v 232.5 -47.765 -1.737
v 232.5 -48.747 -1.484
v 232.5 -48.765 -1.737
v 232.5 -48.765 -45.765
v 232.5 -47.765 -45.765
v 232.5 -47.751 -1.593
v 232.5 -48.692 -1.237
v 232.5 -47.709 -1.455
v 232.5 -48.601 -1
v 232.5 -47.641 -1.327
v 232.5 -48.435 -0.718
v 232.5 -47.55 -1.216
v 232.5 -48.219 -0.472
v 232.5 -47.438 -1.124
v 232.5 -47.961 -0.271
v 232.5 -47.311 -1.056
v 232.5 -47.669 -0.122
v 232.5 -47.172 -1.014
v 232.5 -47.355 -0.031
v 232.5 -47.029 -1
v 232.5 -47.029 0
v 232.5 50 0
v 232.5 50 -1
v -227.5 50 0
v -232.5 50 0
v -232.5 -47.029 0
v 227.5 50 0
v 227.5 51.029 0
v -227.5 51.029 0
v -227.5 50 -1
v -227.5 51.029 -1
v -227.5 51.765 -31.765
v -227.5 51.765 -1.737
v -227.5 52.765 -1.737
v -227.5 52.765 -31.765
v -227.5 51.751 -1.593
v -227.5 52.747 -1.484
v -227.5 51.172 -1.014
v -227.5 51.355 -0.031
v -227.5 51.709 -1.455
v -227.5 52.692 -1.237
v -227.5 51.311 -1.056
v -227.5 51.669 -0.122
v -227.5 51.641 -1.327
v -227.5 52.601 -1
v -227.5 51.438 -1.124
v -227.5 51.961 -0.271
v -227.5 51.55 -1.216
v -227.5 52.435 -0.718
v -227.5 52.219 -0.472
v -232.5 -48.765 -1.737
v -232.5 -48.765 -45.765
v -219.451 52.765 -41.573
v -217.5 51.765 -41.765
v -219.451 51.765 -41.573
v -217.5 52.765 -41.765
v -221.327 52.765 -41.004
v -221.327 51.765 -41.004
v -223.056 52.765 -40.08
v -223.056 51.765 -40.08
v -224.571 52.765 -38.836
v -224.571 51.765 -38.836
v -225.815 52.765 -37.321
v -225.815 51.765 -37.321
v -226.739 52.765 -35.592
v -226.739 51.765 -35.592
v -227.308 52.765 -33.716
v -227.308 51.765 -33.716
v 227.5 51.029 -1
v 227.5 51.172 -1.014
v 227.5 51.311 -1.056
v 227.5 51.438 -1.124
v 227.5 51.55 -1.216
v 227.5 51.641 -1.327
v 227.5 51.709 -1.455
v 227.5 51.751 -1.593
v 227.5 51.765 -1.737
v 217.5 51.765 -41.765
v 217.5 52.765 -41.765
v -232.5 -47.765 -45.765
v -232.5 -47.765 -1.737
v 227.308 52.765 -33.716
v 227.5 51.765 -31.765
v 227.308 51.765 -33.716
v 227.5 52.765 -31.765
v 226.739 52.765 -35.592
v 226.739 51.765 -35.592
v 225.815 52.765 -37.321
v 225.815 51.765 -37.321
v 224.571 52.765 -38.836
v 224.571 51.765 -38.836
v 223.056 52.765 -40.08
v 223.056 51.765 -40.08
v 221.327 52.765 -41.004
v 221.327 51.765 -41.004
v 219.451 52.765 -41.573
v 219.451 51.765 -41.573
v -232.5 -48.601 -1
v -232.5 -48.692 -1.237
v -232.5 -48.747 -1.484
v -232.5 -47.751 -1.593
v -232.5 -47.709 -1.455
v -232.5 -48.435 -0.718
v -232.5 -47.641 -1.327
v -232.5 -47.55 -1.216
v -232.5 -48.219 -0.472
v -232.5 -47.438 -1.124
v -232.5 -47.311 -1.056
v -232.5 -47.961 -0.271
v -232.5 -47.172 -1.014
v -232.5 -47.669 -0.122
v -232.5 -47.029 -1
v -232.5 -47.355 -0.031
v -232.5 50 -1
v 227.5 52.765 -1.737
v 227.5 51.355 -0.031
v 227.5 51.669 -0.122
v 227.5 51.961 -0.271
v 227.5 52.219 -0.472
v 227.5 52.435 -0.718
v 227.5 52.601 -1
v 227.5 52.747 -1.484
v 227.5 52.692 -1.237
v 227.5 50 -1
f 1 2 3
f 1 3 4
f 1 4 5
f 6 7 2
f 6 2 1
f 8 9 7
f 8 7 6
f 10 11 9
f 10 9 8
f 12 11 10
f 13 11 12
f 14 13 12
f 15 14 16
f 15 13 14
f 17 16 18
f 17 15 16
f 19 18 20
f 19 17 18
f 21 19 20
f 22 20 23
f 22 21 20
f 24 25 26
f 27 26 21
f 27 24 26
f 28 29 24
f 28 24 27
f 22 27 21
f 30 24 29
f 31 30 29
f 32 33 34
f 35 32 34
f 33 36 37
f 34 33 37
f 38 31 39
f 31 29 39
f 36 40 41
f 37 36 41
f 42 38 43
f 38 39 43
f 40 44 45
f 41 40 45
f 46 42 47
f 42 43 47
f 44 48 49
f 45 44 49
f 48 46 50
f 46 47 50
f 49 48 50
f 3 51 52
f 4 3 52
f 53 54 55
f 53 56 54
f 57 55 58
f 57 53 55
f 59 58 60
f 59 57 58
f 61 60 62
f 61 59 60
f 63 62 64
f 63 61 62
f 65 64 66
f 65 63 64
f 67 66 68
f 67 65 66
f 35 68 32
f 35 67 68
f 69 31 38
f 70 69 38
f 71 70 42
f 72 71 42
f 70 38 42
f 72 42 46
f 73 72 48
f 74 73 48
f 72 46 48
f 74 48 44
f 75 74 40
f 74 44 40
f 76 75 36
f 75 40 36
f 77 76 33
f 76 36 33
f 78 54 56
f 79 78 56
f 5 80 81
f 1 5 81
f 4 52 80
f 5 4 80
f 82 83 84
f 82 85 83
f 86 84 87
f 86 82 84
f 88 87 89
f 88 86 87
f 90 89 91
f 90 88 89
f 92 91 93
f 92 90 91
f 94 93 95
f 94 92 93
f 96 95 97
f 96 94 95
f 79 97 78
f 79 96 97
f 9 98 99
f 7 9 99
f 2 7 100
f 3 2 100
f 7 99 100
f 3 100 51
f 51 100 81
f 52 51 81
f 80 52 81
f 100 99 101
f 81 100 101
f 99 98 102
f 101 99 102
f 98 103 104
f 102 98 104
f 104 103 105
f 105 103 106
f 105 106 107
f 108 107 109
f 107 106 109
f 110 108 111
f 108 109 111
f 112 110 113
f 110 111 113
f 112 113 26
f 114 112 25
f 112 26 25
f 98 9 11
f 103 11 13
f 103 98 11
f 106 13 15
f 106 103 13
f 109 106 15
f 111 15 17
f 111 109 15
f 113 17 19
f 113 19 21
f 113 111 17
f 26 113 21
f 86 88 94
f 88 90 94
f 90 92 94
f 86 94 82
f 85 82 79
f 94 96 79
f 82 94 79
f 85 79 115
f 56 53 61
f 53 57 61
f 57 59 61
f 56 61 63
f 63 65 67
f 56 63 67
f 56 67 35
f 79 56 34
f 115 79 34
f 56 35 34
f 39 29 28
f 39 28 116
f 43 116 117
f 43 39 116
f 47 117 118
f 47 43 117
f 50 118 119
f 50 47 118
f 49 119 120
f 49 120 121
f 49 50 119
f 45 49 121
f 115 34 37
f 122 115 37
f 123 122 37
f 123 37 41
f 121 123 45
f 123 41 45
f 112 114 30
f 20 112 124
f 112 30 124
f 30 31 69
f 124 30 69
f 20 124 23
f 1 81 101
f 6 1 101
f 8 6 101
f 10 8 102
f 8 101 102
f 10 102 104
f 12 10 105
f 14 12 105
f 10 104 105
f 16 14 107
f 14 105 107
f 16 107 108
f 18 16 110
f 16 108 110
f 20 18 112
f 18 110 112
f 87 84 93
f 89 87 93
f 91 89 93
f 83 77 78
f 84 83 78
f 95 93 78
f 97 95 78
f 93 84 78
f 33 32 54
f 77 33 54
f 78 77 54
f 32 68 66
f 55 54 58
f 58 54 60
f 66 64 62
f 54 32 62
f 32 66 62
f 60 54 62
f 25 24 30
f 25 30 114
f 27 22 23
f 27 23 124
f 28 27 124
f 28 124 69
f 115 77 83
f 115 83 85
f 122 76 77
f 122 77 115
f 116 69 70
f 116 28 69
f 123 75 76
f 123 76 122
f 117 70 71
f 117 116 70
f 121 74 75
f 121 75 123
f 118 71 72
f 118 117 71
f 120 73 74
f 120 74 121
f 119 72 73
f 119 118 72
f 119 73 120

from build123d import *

# Parameters (mm, degrees)
BASE_FLANGE1_DEPTH     = 1
SKETCHED_START         = -232.5
SKETCHED_BEND1_DEPTH   = 465
SKETCHED_START_2       = -227.5
SKETCHED_BEND1_2_DEPTH = 455
SKETCHED_BEND1_3_DEPTH = 465
FILLET1_R              = 10


# Read off the part's stored shape, not the designer's step: Sketched Bend1
# Sheet-metal steps are written as plain solids
with BuildPart() as part:
    # Sketch1 → Base-Flange1 (new body)
    with BuildSketch(Plane.XY):
        Polygon((-227.5, 93), (-227.5, 50), (-232.5, 50), (-232.5, -93), (232.5, -93), (232.5, 50), (227.5, 50), (227.5, 93), align=None)
    extrude(amount=-BASE_FLANGE1_DEPTH)

    # Sketched Bend1 outline → Sketched Bend1 (cut)
    with BuildSketch(Plane.YZ.offset(SKETCHED_START)):
        with BuildLine():
            ThreePointArc((51.028776631, 0), (51.960602795, -0.271171885), (52.601417721, -1))
            Line((52.601417721, -1), (93, -1))
            Line((93, -1), (93, 0))
            Line((93, 0), (51.028776631, 0))
        make_face()
        with BuildLine():
            Line((-93, -1), (-48.601417721, -1))
            ThreePointArc((-48.601417721, -1), (-47.960602795, -0.271171885), (-47.028776631, 0))
            Line((-47.028776631, 0), (-93, 0))
            Line((-93, 0), (-93, -1))
        make_face()
    extrude(amount=SKETCHED_BEND1_DEPTH, mode=Mode.SUBTRACT)

    # Sketched Bend1 2 outline → Sketched Bend1 2 (add)
    with BuildSketch(Plane.YZ.offset(SKETCHED_START_2)):
        with BuildLine():
            ThreePointArc((51.028776631, -1), (51.549631486, -1.215745145), (51.765376631, -1.7366))
            Line((51.765376631, -1.7366), (51.765376631, -41.765376631))
            Line((51.765376631, -41.765376631), (52.765376631, -41.765376631))
            Line((52.765376631, -41.765376631), (52.765376631, -1.7366))
            ThreePointArc((52.765376631, -1.7366), (52.723891388, -1.359286442), (52.601417721, -1))
            Line((52.601417721, -1), (51.028776631, -1))
        make_face()
        with BuildLine():
            ThreePointArc((-47.765376631, -1.7366), (-47.549631486, -1.215745145), (-47.028776631, -1))
            Line((-47.028776631, -1), (-48.601417721, -1))
            ThreePointArc((-48.601417721, -1), (-48.723891388, -1.359286442), (-48.765376631, -1.7366))
            Line((-48.765376631, -1.7366), (-48.765376631, -45.765376631))
            Line((-48.765376631, -45.765376631), (-47.765376631, -45.765376631))
            Line((-47.765376631, -45.765376631), (-47.765376631, -1.7366))
        make_face()
    extrude(amount=SKETCHED_BEND1_2_DEPTH)

    # Sketched Bend1 3 outline → Sketched Bend1 3 (add)
    with BuildSketch(Plane.YZ.offset(SKETCHED_START)):
        with BuildLine():
            ThreePointArc((-47.765376631, -1.7366), (-47.549631486, -1.215745145), (-47.028776631, -1))
            Line((-47.028776631, -1), (-48.601417721, -1))
            ThreePointArc((-48.601417721, -1), (-48.723891388, -1.359286442), (-48.765376631, -1.7366))
            Line((-48.765376631, -1.7366), (-48.765376631, -45.765376631))
            Line((-48.765376631, -45.765376631), (-47.765376631, -45.765376631))
            Line((-47.765376631, -45.765376631), (-47.765376631, -1.7366))
        make_face()
    extrude(amount=SKETCHED_BEND1_3_DEPTH)

    # Fillet1
    fillet1_edges = [part.edges().sort_by_distance(p)[0] for p in [
        (-227.5, 52.265376631, -41.765376631),
        (227.5, 52.265376631, -41.765376631),
    ]]
    fillet(fillet1_edges, radius=FILLET1_R)


solid = part.part
